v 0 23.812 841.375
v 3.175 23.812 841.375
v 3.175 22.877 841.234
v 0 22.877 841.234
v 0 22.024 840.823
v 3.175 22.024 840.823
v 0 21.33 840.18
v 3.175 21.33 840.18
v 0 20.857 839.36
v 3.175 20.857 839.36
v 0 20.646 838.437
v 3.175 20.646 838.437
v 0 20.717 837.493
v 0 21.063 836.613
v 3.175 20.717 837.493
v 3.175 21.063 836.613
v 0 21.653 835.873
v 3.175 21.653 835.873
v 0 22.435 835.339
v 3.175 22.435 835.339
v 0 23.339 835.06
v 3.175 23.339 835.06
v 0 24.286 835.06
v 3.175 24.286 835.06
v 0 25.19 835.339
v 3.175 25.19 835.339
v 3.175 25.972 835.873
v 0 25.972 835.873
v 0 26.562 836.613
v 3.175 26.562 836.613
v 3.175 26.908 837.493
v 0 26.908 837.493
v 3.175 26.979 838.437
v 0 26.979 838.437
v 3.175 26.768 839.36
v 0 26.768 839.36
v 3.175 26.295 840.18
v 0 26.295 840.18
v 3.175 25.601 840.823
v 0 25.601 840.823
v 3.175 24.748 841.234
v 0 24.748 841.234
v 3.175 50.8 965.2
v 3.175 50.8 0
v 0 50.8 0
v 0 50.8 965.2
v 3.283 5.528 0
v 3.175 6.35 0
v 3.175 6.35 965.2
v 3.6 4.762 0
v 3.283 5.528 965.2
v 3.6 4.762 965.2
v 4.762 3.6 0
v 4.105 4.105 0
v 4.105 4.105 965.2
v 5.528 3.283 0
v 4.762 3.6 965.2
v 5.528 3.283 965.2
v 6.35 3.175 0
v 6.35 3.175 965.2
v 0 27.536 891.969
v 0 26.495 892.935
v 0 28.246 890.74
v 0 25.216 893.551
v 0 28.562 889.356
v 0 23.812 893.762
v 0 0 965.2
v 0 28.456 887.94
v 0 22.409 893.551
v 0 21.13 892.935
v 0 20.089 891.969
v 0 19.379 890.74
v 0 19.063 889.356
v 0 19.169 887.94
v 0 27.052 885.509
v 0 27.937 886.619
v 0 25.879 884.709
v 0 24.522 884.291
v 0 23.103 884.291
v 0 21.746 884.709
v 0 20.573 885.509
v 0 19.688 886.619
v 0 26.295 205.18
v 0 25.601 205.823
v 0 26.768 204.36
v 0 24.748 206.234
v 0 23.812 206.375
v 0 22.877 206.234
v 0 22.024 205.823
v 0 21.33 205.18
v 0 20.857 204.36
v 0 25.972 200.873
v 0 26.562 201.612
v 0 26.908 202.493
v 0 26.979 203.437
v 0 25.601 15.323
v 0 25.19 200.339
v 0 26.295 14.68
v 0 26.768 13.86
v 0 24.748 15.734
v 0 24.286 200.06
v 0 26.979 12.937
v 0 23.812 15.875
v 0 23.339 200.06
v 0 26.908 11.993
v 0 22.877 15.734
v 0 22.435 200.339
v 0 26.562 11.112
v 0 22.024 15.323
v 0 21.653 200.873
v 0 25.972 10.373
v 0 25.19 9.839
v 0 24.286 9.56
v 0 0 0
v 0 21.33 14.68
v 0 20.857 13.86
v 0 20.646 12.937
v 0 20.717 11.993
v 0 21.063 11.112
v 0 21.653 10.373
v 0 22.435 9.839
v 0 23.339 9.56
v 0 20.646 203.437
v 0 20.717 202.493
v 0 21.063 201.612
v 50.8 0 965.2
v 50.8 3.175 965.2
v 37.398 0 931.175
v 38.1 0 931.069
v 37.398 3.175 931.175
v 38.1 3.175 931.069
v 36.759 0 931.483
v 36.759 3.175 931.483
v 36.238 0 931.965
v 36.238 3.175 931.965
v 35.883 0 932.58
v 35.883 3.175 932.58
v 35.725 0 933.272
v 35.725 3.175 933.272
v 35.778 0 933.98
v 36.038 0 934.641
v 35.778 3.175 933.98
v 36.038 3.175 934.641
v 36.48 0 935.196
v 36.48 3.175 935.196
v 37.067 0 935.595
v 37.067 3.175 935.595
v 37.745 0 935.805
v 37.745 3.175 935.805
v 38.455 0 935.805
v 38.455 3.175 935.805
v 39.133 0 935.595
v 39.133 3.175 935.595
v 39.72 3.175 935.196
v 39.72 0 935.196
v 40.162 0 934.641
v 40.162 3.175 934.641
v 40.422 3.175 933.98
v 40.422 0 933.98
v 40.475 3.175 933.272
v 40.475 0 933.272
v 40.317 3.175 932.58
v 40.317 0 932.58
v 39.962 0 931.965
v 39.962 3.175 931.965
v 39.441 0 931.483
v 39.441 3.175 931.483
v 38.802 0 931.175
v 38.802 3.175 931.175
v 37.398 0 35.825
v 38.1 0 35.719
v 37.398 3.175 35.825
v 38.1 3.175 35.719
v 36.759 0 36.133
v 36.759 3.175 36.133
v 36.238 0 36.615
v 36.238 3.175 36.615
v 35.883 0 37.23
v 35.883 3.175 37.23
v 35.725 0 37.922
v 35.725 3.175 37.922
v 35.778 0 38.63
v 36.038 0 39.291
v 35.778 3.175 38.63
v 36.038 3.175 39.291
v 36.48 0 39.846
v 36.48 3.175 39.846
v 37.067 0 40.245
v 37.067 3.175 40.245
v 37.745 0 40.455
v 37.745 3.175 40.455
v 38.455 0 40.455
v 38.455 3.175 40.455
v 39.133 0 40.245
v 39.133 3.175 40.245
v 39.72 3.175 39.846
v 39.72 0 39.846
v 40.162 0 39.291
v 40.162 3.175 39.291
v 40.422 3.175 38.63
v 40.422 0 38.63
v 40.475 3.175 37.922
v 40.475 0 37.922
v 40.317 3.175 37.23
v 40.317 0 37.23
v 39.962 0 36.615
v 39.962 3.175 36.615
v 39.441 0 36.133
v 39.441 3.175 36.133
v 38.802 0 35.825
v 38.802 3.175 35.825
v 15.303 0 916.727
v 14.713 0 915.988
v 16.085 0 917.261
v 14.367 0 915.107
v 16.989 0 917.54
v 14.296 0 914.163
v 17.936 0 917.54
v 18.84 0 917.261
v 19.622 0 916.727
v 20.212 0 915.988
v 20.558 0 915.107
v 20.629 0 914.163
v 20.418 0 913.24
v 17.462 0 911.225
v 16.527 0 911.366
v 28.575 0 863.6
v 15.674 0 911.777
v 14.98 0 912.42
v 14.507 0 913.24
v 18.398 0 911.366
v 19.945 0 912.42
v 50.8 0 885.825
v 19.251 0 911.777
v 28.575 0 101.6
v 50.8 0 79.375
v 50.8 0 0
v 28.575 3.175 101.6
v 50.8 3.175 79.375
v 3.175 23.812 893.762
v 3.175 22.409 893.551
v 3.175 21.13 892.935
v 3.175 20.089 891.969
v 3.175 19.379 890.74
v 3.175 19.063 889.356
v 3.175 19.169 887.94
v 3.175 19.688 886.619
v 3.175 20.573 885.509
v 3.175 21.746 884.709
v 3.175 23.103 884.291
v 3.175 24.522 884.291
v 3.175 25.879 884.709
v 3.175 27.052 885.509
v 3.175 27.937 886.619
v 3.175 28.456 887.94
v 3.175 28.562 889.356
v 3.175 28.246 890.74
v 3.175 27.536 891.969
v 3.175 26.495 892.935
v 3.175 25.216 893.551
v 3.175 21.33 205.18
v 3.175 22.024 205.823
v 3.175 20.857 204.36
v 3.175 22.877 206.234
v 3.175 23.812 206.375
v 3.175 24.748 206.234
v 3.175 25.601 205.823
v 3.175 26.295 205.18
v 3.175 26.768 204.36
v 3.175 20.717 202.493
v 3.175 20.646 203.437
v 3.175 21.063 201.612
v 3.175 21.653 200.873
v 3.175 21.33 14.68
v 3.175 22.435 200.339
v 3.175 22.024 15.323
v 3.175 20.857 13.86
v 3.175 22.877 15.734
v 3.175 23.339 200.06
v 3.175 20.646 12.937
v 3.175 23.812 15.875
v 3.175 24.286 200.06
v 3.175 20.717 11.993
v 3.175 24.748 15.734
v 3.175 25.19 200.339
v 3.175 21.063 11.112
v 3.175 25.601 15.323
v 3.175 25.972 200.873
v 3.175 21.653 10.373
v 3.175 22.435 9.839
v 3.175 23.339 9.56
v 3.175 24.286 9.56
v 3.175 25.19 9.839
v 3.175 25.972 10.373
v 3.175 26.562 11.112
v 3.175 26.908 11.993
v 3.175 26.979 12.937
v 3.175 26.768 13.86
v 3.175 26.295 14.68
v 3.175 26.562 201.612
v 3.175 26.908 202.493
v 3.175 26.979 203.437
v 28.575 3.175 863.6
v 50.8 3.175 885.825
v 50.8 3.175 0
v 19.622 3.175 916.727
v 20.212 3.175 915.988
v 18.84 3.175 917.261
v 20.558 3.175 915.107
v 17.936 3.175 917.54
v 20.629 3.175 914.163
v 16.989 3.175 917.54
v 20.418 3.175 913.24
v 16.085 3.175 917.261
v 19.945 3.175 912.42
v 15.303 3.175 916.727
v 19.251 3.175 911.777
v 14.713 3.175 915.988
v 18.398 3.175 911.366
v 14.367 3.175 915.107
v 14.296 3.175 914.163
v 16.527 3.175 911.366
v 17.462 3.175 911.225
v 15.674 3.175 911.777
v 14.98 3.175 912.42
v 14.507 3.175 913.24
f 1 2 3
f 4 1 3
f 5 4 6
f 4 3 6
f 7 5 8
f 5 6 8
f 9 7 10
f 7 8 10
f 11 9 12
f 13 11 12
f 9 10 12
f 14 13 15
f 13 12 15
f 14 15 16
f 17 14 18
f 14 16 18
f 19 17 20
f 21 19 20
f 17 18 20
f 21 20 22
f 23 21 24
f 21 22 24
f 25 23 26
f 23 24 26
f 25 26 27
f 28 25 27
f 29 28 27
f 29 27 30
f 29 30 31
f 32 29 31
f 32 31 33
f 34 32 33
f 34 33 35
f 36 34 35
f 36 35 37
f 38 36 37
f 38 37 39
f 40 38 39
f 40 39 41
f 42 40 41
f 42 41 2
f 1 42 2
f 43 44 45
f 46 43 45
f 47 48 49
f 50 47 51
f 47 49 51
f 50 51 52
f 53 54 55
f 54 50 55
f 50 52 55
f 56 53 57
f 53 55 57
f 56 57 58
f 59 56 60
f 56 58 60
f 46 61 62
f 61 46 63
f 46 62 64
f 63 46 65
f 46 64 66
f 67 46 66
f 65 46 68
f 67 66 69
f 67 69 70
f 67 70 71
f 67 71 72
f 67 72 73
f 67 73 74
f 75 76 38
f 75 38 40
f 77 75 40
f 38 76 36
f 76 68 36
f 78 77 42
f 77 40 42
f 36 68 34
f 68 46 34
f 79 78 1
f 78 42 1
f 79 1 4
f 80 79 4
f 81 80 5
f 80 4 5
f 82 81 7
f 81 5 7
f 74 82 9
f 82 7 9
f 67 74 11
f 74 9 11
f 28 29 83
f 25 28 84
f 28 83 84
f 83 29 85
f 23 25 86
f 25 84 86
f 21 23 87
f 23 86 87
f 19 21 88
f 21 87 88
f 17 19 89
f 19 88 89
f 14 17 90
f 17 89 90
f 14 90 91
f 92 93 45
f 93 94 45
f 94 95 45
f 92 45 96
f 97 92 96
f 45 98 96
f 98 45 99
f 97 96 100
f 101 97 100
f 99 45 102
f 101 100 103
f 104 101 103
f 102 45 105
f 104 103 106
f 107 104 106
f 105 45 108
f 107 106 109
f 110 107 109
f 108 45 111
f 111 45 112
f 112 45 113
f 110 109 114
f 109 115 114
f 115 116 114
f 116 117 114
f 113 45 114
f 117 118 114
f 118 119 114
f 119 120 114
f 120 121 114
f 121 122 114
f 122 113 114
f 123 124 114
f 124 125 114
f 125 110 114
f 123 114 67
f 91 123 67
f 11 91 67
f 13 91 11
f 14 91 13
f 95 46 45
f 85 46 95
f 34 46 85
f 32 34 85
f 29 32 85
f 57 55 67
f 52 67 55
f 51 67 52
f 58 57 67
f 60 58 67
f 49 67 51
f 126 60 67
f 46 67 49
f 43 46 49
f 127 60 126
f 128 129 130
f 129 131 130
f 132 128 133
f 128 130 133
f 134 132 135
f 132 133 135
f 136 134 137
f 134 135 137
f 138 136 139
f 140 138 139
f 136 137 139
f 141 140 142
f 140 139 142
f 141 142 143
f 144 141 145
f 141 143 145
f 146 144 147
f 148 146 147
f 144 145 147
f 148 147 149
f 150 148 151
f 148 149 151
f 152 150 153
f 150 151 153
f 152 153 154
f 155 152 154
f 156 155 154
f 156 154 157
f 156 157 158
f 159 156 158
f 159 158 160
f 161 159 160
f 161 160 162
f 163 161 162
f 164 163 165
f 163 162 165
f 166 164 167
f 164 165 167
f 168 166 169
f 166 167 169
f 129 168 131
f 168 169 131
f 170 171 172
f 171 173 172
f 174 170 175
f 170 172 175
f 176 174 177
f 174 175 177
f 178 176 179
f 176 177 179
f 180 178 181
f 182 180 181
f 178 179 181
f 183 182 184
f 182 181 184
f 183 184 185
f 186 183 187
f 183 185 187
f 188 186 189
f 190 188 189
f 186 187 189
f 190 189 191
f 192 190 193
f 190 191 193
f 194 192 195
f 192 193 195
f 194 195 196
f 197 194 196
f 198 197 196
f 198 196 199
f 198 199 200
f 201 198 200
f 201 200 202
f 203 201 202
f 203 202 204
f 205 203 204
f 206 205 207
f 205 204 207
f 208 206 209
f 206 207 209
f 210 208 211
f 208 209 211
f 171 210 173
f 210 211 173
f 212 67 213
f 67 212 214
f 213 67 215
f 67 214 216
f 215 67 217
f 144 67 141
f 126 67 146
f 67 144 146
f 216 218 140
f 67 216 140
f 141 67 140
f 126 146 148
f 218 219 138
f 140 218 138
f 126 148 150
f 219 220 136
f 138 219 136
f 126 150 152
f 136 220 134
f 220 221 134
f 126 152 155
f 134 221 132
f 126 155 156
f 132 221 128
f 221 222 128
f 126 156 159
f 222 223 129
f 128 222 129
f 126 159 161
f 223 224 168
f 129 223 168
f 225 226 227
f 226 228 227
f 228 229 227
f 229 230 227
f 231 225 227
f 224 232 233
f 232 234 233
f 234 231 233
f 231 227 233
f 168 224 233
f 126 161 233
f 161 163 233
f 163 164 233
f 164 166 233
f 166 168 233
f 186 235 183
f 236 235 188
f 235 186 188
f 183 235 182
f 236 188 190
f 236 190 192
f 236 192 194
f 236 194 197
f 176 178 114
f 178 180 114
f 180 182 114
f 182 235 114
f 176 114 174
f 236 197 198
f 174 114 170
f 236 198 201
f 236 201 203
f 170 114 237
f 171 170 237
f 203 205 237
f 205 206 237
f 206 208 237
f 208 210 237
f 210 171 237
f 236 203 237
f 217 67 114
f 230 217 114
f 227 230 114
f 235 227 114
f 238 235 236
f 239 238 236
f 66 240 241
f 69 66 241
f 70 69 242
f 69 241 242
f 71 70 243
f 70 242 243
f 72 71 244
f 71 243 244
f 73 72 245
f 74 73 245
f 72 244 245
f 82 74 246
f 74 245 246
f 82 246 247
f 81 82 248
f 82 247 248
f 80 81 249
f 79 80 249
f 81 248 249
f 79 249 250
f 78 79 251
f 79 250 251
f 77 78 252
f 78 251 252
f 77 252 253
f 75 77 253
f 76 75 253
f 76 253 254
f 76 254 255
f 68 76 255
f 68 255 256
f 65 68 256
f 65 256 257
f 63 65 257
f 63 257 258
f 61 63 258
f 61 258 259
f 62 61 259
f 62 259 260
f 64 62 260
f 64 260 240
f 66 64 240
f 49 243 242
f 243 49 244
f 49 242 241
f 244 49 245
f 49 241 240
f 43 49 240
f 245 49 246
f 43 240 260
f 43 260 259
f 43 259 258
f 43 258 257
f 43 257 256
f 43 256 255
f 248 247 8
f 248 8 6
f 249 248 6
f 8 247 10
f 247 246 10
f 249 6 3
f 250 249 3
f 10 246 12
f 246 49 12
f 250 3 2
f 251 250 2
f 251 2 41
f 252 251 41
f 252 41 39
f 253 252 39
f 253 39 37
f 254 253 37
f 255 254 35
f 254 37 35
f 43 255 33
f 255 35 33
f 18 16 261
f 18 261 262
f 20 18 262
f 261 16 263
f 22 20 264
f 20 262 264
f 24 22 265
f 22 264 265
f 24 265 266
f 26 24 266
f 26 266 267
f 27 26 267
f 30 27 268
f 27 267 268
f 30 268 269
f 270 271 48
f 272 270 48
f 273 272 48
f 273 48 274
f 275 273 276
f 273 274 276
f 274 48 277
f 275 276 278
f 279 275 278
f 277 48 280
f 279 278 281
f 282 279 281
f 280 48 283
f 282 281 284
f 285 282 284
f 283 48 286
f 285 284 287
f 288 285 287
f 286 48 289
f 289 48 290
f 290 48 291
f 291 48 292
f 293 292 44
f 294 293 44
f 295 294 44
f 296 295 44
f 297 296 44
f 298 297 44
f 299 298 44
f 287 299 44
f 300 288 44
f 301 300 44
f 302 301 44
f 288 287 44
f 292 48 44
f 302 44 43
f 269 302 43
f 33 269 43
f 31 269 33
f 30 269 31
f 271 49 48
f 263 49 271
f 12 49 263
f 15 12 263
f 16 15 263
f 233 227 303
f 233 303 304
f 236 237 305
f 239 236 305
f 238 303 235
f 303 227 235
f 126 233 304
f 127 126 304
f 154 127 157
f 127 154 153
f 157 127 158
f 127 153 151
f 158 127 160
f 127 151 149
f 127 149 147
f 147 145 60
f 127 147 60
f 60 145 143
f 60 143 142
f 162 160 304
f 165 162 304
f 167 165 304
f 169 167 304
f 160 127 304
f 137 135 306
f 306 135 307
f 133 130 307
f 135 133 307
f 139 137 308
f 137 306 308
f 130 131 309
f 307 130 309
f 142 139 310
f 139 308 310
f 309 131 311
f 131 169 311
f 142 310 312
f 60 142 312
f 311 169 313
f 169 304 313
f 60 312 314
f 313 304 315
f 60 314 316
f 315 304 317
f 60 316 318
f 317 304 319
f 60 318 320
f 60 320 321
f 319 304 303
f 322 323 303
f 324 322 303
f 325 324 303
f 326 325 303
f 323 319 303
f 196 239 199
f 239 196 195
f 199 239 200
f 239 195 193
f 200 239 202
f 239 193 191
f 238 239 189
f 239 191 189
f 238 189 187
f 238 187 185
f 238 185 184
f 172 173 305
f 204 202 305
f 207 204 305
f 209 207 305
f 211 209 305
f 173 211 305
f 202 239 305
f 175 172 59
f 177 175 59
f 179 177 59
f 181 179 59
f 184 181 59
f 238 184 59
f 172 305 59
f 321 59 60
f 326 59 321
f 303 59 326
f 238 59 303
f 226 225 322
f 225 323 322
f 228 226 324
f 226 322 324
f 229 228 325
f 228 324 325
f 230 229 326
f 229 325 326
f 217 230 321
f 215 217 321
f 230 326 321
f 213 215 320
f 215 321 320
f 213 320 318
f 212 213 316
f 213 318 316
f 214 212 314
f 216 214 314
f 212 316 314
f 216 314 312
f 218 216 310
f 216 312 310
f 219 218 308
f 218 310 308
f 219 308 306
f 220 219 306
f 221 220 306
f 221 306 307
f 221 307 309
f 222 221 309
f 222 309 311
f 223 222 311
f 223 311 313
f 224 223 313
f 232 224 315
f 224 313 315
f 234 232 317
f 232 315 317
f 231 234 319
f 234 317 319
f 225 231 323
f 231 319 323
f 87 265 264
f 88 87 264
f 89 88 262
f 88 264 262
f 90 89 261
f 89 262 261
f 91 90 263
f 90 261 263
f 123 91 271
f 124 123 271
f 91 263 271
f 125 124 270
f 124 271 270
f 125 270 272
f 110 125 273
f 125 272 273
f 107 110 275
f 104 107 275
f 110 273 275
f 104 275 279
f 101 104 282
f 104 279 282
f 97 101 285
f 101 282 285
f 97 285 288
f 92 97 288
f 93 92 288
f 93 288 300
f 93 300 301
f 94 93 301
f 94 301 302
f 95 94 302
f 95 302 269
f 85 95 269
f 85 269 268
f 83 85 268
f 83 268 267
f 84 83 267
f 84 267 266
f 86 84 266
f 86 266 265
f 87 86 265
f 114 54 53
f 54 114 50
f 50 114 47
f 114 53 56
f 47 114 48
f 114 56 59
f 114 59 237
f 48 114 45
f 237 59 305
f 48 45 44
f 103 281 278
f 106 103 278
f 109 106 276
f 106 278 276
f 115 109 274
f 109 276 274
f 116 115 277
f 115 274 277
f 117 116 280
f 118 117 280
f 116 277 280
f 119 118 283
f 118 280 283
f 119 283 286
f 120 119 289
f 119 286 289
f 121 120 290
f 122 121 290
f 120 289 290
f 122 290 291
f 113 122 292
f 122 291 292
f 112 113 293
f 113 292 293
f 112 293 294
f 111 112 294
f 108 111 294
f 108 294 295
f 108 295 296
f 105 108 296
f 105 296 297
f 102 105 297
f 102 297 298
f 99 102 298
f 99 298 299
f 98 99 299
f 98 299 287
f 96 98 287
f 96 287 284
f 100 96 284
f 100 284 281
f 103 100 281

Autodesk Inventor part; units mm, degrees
ref_plane "YZ Plane" through (0, 0, 0) normal (1, 0, 0) x (0, 1, 0)
ref_plane "XZ Plane" through (0, 0, 0) normal (0, 1, 0) x (-1, 0, 0)
ref_plane "XY Plane" through (0, 0, 0) normal (0, 0, 1) x (1, 0, 0)
sketch "Sketch1" plane through (0, 0, 0) normal (0, 0, 1) x (1, 0, 0)
  line L0 (0, 0) -> (3.175, 0)
  line L1 (3.175, 0) -> (3.175, 50.8)
  line L2 (3.175, 50.8) -> (0, 50.8)
  line L3 (0, 50.8) -> (0, 0)
  line L4 (0, 0) -> (50.8, 0)
  line L5 (50.8, 0) -> (50.8, 3.175)
  line L6 (50.8, 3.175) -> (0, 3.175)
  line L7 (0, 3.175) -> (0, 0)
  dimension "d0" = 3.175
  dimension "d1" = 50.8
  dimension "d2" = 50.8
  dimension "d3" = 3.175
extrude "Extrusion1" add sketch "Sketch1" along normal blind 965.2
sketch "Sketch2" plane through (0, 0, 0) normal (-1, 0, 0) x (0, 0, 1)
  line L0 (0, 50.8) -> (0, 0) projected
  line L1 (0, 0) -> (965.2, 0) projected
  point P0 (12.7, 23.8125)
  point P1 (203.2, 23.8125)
  dimension "d6" = 23.8125
  dimension "d7" = 23.8125
  dimension "d8" = 12.7
  dimension "d9" = 203.2
hole "Hole1" at (0, 23.8125, 12.7) at (0, 23.8125, 203.2) direction (1, 0, 0) diameter 6.35 end through all
sketch "Sketch3" plane through (0, 0, 0) normal (-1, 0, 0) x (0, 0, 1)
  line L0 (0, 0) -> (965.2, 0) projected
  line L1 (0, 50.8) -> (0, 0) projected
  point P0 (889, 23.8125)
  dimension "d17" = 23.8125
  dimension "d26" = 889
hole "Hole2" at (0, 23.8125, 889) direction (1, 0, 0) diameter 9.525 end through all
sketch "Sketch4" plane through (0, 0, 0) normal (0, -1, 0) x (1, 0, 0)
  line L0 (0, 965.2) -> (50.8, 965.2) projected
  line L1 (0, 0) -> (0, 965.2) projected
  point P0 (17.4625, 914.4)
  dimension "d27" = 17.4625
  dimension "d28" = 50.8
hole "Hole3" at (17.4625, 0, 914.4) direction (0, 1, 0) diameter 6.35 end through all
fillet "Fillet1" radius 3.175 1 edges at (3.175, 3.175, 482.6)
sketch "Sketch6" plane through (0, 0, 0) normal (0, -1, 0) x (1, 0, 0)
  line L0 (0, 0) -> (50.8, 0) projected
  line L1 (50.8, 0) -> (50.8, 965.2) projected
  line L2 (0, 965.2) -> (50.8, 965.2) projected
  point P0 (38.1, 933.45)
  point P1 (38.1, 38.1)
  dimension "d49" = 38.1
  dimension "d50" = 12.7
  dimension "d51" = 31.75
  dimension "d52" = 12.7
hole "Hole5" at (38.1, 0, 933.45) at (38.1, 0, 38.1) direction (0, 1, 0) diameter 4.7625 end through all
sketch "Sketch8" plane through (0, 0, 0) normal (0, -1, 0) x (1, 0, 0)
  circle A0 centre (38.1, 933.45) radius 2.3813 projected
  circle A1 centre (38.1, 38.1) radius 2.3813 projected
  circle A2 centre (17.4625, 914.4) radius 3.175 projected
  line L0 (0, 0) -> (50.8, 0) projected
  line L1 (50.8, 0) -> (50.8, 965.2) projected
  line L2 (0, 965.2) -> (50.8, 965.2) projected
  line L3 (0, 0) -> (0, 965.2) projected
  line L4 (50.8, 863.6) -> (28.575, 863.6)
  line L5 (28.575, 863.6) -> (28.575, 101.6)
  line L6 (28.575, 101.6) -> (50.8, 101.6)
  line L7 (50.8, 101.6) -> (50.8, 863.6)
  line L8 (28.575, 863.6) -> (50.8, 885.825)
  line L9 (50.8, 0) -> (50.8, 965.2) projected
  line L10 (28.575, 863.6) -> (60.0059, 863.6) construction
  line L11 (50.8, 885.825) -> (50.8, 863.6)
  line L12 (28.575, 101.6) -> (50.8, 79.375)
  line L13 (28.575, 101.6) -> (60.0059, 101.6) construction
  line L14 (50.8, 79.375) -> (50.8, 101.6)
  dimension "d60" = 22.225
  dimension "d61" = 101.6
  dimension "d62" = 101.6
  dimension "d63" = 45
  dimension "d64" = 45
extrude "Extrusion2" cut sketch "Sketch8" against normal blind 25.4 contours L12 L6 L1 | L6 L5 L4 L1 | L1 L4 L8
sketch "Sketch9" plane through (0, 0, 0) normal (-1, 0, 0) x (0, 0, 1)
  circle A0 centre (889, 23.8125) radius 4.7625 projected
  circle A1 centre (12.7, 23.8125) radius 3.175 projected
  circle A2 centre (203.2, 23.8125) radius 3.175 projected
  line L0 (0, 50.8) -> (0, 0) projected
  line L1 (0, 0) -> (965.2, 0) projected
  line L2 (965.2, 50.8) -> (965.2, 0) projected
  line L3 (0, 50.8) -> (965.2, 50.8) projected
  point P0 (838.2, 23.8125)
  dimension "d67" = 23.8125
  dimension "d68" = 127
hole "Hole6" at (0, 23.8125, 838.2) direction (1, 0, 0) diameter 6.35 end through all
properties part number "rail support 2x2 angle" material "Aluminum 6061"
